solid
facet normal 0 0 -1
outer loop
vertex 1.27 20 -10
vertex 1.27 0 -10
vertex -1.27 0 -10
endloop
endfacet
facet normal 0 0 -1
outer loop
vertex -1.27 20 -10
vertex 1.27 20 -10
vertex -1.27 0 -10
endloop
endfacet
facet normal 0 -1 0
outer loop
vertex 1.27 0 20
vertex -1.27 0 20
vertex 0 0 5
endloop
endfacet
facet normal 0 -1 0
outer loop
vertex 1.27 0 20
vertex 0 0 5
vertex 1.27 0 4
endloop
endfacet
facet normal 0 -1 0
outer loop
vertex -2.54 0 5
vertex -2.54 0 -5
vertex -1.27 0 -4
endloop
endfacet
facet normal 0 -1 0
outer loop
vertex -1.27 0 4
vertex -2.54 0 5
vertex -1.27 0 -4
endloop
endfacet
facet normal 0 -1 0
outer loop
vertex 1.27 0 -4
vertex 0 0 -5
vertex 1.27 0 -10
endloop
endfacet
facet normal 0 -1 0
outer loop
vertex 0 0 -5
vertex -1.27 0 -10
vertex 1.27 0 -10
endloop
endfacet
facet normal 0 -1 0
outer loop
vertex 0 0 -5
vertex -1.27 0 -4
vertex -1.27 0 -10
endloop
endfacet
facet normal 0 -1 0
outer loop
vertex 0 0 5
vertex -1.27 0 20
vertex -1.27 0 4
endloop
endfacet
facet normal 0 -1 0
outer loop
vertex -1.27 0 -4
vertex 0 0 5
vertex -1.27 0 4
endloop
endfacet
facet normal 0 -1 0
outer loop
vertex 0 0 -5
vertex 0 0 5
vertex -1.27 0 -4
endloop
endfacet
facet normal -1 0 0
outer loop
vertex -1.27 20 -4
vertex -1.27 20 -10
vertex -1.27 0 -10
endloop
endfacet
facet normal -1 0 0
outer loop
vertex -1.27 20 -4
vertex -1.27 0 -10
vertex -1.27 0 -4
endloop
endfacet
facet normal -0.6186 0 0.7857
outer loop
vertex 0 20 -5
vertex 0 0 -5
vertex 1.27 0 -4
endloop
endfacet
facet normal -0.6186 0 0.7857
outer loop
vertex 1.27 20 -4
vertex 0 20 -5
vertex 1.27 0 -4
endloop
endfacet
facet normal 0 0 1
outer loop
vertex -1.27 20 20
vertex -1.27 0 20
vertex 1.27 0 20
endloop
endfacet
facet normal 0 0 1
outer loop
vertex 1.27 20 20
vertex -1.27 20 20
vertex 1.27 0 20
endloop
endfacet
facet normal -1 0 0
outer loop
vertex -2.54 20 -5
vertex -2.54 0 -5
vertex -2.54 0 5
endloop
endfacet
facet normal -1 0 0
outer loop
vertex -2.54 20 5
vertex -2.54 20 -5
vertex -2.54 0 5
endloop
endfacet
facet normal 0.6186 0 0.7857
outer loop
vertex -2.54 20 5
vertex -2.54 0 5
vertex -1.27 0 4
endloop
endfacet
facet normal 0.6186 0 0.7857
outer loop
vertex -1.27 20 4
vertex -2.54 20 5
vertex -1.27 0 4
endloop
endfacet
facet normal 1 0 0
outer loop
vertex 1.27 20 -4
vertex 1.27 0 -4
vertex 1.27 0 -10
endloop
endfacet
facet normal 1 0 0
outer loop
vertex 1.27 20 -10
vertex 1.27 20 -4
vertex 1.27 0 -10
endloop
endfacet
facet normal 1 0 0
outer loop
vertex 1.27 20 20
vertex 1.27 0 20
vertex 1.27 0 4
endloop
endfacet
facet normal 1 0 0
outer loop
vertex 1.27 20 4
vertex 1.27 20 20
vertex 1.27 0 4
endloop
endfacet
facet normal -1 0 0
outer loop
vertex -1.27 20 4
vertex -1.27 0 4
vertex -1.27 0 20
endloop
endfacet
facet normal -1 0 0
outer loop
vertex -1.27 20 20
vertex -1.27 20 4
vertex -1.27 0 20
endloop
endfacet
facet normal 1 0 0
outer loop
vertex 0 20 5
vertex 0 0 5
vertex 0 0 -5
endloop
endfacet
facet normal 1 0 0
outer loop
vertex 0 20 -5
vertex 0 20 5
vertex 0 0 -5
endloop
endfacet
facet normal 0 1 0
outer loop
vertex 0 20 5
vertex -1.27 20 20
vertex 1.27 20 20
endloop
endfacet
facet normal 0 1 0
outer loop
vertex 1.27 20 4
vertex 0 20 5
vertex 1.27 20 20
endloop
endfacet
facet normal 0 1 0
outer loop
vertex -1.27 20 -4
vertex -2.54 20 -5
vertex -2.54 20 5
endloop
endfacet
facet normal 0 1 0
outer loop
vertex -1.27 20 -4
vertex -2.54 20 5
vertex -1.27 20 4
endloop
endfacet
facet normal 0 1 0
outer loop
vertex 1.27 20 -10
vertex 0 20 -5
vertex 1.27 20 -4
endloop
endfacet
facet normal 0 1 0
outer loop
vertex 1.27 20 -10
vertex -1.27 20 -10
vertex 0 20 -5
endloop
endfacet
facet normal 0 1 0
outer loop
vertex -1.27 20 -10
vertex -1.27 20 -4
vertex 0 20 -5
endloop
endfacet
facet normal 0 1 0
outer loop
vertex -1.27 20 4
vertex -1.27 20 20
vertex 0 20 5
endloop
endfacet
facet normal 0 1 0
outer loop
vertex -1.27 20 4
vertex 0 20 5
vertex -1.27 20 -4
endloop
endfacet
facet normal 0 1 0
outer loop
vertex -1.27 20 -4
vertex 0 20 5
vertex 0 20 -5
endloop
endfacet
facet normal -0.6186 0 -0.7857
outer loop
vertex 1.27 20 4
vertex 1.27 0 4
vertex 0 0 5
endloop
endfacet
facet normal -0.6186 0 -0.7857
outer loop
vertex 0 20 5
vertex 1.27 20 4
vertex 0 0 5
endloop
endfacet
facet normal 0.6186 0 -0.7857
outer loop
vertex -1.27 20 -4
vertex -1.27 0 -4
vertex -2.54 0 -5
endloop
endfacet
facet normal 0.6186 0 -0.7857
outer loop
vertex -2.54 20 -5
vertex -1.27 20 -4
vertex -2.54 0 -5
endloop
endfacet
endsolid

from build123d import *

# Parameters (mm, degrees)
BOSS_EXTRUDE1_DEPTH = 20


with BuildPart() as part:
    # Sketch1 → Boss-Extrude1 (new body)
    with BuildSketch(Plane(origin=(0, 0, 0), x_dir=(1, 0, 0), z_dir=(0, 1, 0))):
        Polygon((0, 5), (1.27, 4), (1.27, 10), (-1.27, 10), (-1.27, 4), (-1.27, -4), (-1.27, -20), (1.27, -20), (1.27, -5), (1.27, -4), (0, -5), align=None)
        Polygon((-2.54, 5), (-2.54, -5), (-1.27, -4), (-1.27, 4), align=None)
    extrude(amount=BOSS_EXTRUDE1_DEPTH)


solid = part.part
